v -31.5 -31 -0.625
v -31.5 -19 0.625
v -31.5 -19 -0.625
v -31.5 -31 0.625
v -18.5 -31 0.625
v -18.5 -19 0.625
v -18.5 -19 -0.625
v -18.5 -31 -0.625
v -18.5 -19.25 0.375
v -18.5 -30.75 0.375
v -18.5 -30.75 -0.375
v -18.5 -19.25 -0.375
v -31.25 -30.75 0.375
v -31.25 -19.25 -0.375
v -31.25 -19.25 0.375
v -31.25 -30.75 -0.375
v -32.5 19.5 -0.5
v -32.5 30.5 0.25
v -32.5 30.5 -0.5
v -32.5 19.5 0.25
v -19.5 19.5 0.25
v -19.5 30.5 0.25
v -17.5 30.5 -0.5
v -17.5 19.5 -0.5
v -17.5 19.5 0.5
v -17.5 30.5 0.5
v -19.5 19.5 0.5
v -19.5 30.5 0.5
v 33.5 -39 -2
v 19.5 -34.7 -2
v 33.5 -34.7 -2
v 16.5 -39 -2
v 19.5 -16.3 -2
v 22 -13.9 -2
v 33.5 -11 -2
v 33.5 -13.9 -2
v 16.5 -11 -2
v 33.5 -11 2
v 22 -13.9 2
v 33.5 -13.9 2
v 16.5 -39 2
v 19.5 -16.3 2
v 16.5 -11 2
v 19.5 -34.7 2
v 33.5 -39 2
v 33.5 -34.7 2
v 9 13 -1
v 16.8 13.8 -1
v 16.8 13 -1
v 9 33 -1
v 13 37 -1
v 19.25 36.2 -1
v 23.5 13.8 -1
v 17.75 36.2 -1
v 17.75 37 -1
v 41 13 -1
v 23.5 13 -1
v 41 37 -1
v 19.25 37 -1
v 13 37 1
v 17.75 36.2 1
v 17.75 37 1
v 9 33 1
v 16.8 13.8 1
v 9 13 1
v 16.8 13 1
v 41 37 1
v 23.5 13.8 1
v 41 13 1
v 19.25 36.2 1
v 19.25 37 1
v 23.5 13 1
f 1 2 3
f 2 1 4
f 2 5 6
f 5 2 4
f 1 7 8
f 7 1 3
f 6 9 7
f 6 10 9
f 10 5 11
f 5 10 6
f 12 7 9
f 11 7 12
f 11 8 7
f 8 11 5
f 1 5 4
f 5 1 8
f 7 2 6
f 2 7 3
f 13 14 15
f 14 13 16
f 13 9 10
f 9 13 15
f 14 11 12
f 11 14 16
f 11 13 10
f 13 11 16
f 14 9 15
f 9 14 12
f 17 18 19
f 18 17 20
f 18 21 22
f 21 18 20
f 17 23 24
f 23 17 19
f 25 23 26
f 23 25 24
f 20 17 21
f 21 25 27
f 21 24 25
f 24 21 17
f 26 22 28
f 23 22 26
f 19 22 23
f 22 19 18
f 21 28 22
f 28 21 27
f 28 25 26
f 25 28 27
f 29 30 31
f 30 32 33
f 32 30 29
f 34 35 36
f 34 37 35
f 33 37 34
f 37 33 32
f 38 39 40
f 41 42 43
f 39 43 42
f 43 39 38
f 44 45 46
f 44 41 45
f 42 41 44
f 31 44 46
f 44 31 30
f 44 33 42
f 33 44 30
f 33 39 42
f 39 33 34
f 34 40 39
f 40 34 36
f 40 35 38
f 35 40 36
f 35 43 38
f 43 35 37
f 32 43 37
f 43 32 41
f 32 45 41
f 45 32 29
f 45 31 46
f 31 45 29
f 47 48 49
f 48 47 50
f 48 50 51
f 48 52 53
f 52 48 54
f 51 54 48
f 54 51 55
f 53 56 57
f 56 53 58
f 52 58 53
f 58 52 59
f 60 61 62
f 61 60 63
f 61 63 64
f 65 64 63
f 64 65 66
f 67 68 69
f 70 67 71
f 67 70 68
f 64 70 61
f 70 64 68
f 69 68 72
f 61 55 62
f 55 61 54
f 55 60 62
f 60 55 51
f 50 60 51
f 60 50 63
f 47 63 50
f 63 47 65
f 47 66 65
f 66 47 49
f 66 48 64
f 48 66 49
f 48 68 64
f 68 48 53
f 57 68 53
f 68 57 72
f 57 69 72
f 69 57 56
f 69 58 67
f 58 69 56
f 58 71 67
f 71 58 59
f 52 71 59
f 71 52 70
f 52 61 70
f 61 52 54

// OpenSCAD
// file: ../globals.scad
// Copyright (c) 2017 Clément Bœsch <u pkh.me>
//
// Permission to use, copy, modify, and distribute this software for any
// purpose with or without fee is hereby granted, provided that the above
// copyright notice and this permission notice appear in all copies.
//
// THE SOFTWARE IS PROVIDED "AS IS" AND THE AUTHOR DISCLAIMS ALL WARRANTIES
// WITH REGARD TO THIS SOFTWARE INCLUDING ALL IMPLIED WARRANTIES OF
// MERCHANTABILITY AND FITNESS. IN NO EVENT SHALL THE AUTHOR BE LIABLE FOR
// ANY SPECIAL, DIRECT, INDIRECT, OR CONSEQUENTIAL DAMAGES OR ANY DAMAGES
// WHATSOEVER RESULTING FROM LOSS OF USE, DATA OR PROFITS, WHETHER IN AN
// ACTION OF CONTRACT, NEGLIGENCE OR OTHER TORTIOUS ACTION, ARISING OUT OF
// OR IN CONNECTION WITH THE USE OR PERFORMANCE OF THIS SOFTWARE.

$fn = 30;

_delta = 0.005;

c_black        = [.17,.17,.17];
c_black_redish = [.35,.30,.30];
c_gold         = [.75,.55,.00];
c_gray         = [.40,.40,.40];
c_darkgray     = [.25,.25,.25];
c_green_pcb    = [.00,.50,.25];
c_metal        = [.70,.70,.70];
c_yellow       = [.70,.70,.30];
c_darkblue     = [.20,.30,.40];
c_blue         = [.35,.50,.90];
// file: _internal.scad
// Copyright (c) 2017 Clément Bœsch <u pkh.me>
//
// Permission to use, copy, modify, and distribute this software for any
// purpose with or without fee is hereby granted, provided that the above
// copyright notice and this permission notice appear in all copies.
//
// THE SOFTWARE IS PROVIDED "AS IS" AND THE AUTHOR DISCLAIMS ALL WARRANTIES
// WITH REGARD TO THIS SOFTWARE INCLUDING ALL IMPLIED WARRANTIES OF
// MERCHANTABILITY AND FITNESS. IN NO EVENT SHALL THE AUTHOR BE LIABLE FOR
// ANY SPECIAL, DIRECT, INDIRECT, OR CONSEQUENTIAL DAMAGES OR ANY DAMAGES
// WHATSOEVER RESULTING FROM LOSS OF USE, DATA OR PROFITS, WHETHER IN AN
// ACTION OF CONTRACT, NEGLIGENCE OR OTHER TORTIOUS ACTION, ARISING OUT OF
// OR IN CONNECTION WITH THE USE OR PERFORMANCE OF THIS SOFTWARE.

include <../globals.scad>

$vpr = [50, 0, 90];

module components_demo(pad=30) {
    n = $children;
    cols = ceil(sqrt(n));
    rows = ceil(n / cols);
    offx = pad * (rows - 1) / 2;
    offy = pad * (cols - 1) / 2;
    for (i = [0:n-1]) {
        x = floor(i / cols);
        y = i % cols;
        translate([x*pad - offx, y*pad - offy])
            rotate(360 * $t)
                children(i);
    }
}
// main file
// Copyright (c) 2017 Clément Bœsch <u pkh.me>
//
// Permission to use, copy, modify, and distribute this software for any
// purpose with or without fee is hereby granted, provided that the above
// copyright notice and this permission notice appear in all copies.
//
// THE SOFTWARE IS PROVIDED "AS IS" AND THE AUTHOR DISCLAIMS ALL WARRANTIES
// WITH REGARD TO THIS SOFTWARE INCLUDING ALL IMPLIED WARRANTIES OF
// MERCHANTABILITY AND FITNESS. IN NO EVENT SHALL THE AUTHOR BE LIABLE FOR
// ANY SPECIAL, DIRECT, INDIRECT, OR CONSEQUENTIAL DAMAGES OR ANY DAMAGES
// WHATSOEVER RESULTING FROM LOSS OF USE, DATA OR PROFITS, WHETHER IN AN
// ACTION OF CONTRACT, NEGLIGENCE OR OTHER TORTIOUS ACTION, ARISING OUT OF
// OR IN CONNECTION WITH THE USE OR PERFORMANCE OF THIS SOFTWARE.

include <_internal.scad>

$vpd = 300;

module microsdslot(dim=[13, 12, 1.25]) {
    t = .25;
    rotate([0, 0, 180]) // XXX
    color(c_metal) {
        difference() {
            cube(dim, center=true);
            translate([-t, 0, 0])
                cube([dim[0], dim[1]-2*t, dim[2]-2*t], center=true);
        }
    }
}

module microsdcard(dim=[15, 11, 1]) {
    l = dim[0];
    w = dim[1];
    h = dim[2];
    tip_dim = [2, w, .25];
    tl = tip_dim[0];
    th = tip_dim[2];
    rotate([0, 0, 180]) // XXX
    color(c_black) {
        translate([0, 0, -tip_dim[2]/2])
            cube([l, w, h-.25], center=true);
        translate([(tl-l)/2, 0, (h-th)/2])
            cube(tip_dim, center=true);
    }
}

module sdslot(dim=[17, 28, 4]) {
    l = dim[0];
    w = dim[1];
    h = dim[2];

    pos = [
        [0, 0],
        [0, w],
        [l, w],
        [l, w-2.9],
        [l-11.5, w-2.9],
        [3, w-5.3],
        [3, 4.3],
        [l, 4.3],
        [l, 0],
    ];

    color(c_black)
        translate(dim * -.5)
            linear_extrude(height=dim[2])
                polygon(pos);
}

module sdcard(dim=[32, 24, 2]) {
    pos = [
        [0,          0],
        [0,          24-4],
        [4,          24],
        [4+6.25,     24],
        [4+6.25,     24-0.8],
        [4+6.25-1.5, 24-0.8],
        [4+6.25-1.5, 24],
        [32,         24],
        [32,         0],
        [7.8+6.7,    0],
        [7.8+6.7,    0.8],
        [7.8,        0.8],
        [7.8,        0],
    ];

    color(c_darkblue)
        translate(dim * -.5)
            linear_extrude(height=dim[2])
                polygon(pos);
}

function microsdslot_info() = [
    ["category", "sd"],
    ["watch", "nowhere"],
];
function microsdcard_info() = [
    ["category", "sd"],
    ["watch", "horizon"],
];

function sdslot_info() = [
    ["category", "sd"],
    ["watch", "nowhere"],
];
function sdcard_info() = [
    ["category", "sd"],
    ["watch", "horizon"],
];

components_demo(pad=50) {
    microsdslot();
    microsdcard();
    sdslot();
    sdcard();
}
